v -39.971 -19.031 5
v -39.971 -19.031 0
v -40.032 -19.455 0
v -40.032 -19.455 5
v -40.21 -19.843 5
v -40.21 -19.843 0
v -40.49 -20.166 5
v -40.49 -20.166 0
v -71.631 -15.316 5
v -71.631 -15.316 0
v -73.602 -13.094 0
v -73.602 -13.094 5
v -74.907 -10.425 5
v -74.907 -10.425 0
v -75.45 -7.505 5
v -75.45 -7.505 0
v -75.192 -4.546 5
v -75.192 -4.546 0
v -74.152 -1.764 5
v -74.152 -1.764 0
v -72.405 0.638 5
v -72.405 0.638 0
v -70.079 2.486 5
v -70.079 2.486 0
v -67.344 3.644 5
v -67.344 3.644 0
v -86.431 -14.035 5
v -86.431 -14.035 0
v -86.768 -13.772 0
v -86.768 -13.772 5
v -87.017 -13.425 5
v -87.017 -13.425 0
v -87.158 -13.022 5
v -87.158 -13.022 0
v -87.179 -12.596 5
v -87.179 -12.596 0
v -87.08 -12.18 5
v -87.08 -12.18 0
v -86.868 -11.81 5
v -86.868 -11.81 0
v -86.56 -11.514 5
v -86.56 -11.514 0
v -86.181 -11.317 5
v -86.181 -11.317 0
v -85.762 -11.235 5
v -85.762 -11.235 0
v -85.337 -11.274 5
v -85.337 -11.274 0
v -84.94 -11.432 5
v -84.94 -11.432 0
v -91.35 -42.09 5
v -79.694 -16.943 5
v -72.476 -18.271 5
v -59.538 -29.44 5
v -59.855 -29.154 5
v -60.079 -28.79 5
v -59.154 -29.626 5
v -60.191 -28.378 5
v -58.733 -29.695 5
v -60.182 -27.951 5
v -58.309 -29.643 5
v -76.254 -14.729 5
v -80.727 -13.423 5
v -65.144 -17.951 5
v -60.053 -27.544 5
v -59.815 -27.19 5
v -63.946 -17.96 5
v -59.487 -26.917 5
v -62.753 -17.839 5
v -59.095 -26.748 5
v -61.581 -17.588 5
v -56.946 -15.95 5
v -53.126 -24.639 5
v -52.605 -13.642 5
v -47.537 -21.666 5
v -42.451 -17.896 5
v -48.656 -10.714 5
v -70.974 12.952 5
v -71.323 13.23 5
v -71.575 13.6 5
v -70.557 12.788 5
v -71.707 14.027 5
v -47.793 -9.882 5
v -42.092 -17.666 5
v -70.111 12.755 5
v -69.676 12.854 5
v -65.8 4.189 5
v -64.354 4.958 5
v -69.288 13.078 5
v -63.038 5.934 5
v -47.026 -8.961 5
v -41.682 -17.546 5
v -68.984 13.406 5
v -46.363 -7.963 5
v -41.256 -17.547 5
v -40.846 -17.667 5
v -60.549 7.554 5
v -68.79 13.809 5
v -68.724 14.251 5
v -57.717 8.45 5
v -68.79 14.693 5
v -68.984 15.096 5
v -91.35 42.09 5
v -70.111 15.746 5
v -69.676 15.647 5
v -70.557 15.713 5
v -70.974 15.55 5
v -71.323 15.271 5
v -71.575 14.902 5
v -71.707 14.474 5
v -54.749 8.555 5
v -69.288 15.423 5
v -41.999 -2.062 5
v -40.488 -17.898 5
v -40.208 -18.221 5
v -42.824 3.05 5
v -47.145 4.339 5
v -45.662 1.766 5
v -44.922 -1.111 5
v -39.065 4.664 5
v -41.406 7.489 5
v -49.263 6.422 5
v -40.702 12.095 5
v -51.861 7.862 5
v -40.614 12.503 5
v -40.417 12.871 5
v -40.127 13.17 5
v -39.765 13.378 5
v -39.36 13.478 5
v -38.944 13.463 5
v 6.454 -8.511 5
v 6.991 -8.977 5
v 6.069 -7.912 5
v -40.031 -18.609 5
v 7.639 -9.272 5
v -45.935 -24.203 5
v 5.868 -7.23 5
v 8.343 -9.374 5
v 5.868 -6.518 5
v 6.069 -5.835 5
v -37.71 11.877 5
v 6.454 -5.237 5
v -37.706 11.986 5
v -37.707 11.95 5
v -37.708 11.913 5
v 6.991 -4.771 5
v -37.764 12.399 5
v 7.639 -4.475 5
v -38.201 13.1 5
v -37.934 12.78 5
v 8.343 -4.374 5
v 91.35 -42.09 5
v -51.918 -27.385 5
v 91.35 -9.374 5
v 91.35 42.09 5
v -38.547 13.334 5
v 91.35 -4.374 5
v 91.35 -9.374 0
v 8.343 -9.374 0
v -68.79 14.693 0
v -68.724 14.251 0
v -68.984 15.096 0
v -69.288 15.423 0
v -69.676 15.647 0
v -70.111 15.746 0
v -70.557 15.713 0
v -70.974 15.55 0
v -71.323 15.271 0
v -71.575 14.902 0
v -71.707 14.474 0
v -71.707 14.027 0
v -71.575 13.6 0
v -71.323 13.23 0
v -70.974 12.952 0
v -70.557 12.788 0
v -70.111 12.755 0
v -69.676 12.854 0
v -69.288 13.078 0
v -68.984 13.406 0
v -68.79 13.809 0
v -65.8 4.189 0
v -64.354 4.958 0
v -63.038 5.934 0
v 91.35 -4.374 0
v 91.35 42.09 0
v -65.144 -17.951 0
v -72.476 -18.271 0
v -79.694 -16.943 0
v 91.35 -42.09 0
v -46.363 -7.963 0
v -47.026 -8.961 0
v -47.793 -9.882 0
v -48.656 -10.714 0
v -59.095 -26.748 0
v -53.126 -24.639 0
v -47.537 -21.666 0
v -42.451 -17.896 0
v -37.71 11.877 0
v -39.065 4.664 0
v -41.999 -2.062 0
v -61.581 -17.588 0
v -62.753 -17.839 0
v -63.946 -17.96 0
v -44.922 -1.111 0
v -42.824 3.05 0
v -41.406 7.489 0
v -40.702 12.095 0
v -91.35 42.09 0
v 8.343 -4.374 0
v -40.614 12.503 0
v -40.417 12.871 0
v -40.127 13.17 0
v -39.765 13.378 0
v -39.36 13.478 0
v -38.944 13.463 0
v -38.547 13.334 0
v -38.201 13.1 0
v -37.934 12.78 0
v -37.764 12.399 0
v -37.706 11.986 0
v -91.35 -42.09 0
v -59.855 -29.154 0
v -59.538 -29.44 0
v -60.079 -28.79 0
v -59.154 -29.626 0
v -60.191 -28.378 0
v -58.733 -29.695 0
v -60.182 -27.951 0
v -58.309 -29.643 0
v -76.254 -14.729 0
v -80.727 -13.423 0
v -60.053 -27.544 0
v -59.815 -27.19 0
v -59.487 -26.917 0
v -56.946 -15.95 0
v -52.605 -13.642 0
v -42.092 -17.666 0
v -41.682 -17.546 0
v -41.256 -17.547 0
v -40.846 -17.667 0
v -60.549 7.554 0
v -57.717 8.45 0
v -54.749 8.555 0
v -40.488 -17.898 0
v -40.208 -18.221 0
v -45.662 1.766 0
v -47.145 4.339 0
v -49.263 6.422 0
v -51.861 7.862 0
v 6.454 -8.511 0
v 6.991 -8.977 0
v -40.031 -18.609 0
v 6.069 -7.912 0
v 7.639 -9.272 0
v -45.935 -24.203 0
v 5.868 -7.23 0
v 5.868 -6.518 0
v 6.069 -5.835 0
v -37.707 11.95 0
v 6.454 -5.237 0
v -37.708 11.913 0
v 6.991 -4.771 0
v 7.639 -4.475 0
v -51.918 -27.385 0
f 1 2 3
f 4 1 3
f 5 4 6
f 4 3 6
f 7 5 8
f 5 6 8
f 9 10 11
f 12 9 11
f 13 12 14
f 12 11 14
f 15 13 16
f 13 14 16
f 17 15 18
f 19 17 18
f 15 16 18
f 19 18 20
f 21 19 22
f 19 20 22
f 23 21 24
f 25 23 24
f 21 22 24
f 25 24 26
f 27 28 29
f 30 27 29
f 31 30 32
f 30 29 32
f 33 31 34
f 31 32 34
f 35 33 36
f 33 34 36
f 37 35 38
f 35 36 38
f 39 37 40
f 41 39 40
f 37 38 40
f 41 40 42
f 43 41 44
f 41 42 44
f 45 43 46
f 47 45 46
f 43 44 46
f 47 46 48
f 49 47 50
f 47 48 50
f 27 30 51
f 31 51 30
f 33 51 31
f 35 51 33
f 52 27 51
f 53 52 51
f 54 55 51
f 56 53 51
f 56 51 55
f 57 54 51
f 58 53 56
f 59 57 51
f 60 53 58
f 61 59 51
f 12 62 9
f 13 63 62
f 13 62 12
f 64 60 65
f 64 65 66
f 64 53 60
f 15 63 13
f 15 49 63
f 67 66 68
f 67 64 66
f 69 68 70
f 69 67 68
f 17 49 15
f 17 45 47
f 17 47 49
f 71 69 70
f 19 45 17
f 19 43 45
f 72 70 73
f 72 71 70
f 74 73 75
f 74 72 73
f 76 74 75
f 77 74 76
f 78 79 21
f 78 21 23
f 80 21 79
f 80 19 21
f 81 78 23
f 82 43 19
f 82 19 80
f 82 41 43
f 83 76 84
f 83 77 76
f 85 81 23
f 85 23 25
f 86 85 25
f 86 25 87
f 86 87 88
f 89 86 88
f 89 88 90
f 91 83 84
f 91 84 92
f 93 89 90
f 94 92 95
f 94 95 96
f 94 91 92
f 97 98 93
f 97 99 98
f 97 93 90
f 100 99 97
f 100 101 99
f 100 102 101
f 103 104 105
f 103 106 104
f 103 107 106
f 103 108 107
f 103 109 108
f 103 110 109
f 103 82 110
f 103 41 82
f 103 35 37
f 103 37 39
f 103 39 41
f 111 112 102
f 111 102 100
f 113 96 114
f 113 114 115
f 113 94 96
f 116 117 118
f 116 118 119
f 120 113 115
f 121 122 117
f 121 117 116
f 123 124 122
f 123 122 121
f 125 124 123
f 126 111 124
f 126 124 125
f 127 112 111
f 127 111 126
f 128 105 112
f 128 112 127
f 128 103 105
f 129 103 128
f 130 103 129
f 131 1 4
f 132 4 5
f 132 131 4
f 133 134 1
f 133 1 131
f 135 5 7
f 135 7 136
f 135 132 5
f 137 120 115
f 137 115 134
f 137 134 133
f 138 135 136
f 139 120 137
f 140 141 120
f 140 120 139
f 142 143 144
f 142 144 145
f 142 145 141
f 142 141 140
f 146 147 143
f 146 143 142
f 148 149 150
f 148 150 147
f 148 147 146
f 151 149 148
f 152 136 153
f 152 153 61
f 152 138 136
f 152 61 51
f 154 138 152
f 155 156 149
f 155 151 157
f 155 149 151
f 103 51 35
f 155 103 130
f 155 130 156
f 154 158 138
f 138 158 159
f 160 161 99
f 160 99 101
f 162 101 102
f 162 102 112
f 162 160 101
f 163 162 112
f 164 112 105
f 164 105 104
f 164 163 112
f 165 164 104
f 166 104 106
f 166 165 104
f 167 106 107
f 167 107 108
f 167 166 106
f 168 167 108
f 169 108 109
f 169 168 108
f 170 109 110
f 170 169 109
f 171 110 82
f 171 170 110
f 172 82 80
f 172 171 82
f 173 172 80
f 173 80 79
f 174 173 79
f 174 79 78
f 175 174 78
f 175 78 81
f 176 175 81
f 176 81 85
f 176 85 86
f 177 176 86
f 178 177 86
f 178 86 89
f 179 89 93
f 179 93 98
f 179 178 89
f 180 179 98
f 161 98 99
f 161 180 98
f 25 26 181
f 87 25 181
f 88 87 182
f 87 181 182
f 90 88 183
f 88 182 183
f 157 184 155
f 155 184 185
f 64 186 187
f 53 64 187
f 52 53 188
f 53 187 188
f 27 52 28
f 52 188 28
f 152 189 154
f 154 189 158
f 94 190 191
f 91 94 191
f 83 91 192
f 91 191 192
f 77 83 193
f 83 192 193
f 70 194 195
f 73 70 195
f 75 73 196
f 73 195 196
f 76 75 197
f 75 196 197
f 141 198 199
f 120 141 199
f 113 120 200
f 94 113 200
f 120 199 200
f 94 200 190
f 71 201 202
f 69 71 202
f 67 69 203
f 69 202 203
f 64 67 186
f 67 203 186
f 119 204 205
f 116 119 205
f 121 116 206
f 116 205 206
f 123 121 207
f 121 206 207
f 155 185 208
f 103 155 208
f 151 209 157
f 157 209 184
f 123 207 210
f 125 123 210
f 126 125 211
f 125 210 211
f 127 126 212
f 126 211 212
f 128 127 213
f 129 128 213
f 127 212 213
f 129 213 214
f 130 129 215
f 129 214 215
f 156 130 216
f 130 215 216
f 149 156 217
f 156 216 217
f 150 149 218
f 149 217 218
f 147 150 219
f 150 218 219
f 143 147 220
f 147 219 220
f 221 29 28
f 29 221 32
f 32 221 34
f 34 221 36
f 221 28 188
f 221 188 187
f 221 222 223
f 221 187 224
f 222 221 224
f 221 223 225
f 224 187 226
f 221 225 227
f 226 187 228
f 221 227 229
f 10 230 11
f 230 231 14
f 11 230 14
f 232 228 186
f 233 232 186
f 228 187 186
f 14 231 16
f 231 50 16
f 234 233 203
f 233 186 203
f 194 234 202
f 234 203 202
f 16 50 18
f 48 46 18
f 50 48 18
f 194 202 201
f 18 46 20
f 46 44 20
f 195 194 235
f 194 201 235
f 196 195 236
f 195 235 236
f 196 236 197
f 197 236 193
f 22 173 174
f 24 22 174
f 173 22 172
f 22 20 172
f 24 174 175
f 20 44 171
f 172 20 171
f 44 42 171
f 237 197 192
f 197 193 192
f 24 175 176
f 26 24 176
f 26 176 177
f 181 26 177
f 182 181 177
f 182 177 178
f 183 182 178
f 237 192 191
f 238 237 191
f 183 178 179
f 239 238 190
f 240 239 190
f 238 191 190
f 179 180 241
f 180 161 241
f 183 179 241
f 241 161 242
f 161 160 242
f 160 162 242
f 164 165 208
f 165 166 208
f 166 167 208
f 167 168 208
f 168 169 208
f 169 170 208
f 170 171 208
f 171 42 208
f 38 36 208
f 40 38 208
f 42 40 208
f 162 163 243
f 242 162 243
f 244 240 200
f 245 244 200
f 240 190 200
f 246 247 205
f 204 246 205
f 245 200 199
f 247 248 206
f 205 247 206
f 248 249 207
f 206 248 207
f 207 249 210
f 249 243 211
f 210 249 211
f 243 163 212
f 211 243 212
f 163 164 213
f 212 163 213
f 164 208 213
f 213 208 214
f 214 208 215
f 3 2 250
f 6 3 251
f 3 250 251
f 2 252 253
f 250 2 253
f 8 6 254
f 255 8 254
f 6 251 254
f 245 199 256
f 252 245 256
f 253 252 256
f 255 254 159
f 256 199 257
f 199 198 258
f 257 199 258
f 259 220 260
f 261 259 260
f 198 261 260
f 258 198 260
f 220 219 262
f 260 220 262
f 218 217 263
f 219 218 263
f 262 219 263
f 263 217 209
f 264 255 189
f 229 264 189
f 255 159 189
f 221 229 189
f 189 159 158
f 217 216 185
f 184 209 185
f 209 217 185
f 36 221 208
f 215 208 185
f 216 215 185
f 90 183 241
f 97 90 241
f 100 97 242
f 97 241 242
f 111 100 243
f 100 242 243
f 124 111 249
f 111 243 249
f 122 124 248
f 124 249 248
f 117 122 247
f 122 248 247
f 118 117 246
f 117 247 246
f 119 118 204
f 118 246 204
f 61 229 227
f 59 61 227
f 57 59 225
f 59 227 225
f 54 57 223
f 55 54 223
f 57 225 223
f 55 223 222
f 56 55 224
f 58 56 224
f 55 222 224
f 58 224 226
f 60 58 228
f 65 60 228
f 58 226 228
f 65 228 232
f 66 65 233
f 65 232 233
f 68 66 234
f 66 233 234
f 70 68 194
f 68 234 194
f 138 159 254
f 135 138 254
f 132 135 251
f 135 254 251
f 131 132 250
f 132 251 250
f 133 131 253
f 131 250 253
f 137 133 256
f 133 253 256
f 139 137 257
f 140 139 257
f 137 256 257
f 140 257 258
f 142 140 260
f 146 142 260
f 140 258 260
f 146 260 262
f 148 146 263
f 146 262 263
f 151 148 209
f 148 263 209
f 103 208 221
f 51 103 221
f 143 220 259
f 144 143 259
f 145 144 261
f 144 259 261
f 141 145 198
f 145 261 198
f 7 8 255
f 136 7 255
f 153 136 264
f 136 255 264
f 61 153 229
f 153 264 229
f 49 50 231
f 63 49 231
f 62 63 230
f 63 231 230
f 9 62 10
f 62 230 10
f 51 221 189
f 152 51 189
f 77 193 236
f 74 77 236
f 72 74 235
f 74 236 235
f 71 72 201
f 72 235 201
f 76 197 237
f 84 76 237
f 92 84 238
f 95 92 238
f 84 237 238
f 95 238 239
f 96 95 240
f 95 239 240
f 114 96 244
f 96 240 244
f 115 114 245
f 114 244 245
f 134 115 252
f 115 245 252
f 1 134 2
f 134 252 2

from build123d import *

# Parameters (mm, degrees)
SKETCH1_R           = 1.5
BOSS_EXTRUDE1_DEPTH = 5


with BuildPart() as part:
    # Sketch1 → Boss-Extrude1 (new body)
    with BuildSketch(Plane.XY):
        with BuildLine():
            Line((-91.35, 42.09), (-91.35, -42.09))
            Line((-91.35, -42.09), (91.35, -42.09))
            Line((91.35, -42.09), (91.35, -9.373756295))
            Line((91.35, -9.373756295), (8.343053199, -9.373756295))
            ThreePointArc((8.343053199, -9.373756295), (5.843053199, -6.873756295), (8.343053199, -4.373756295))
            Line((8.343053199, -4.373756295), (91.35, -4.373756295))
            Line((91.35, -4.373756295), (91.35, 42.09))
            Line((91.35, 42.09), (-91.35, 42.09))
        make_face()
        with BuildLine():
            ThreePointArc((-40.489979298, -20.16630551), (-48.867123378, -25.905481248), (-58.308825968, -29.642984865))
            ThreePointArc((-58.308825968, -29.642984865), (-60.149390448, -28.588317906), (-59.094723489, -26.747753426))
            ThreePointArc((-59.094723489, -26.747753426), (-50.275796541, -23.25677592), (-42.451209718, -17.896156784))
            ThreePointArc((-42.451209718, -17.896156784), (-40.846464239, -17.667243828), (-39.970594508, -19.031231147))
            ThreePointArc((-39.970594508, -19.031231147), (-40.106607189, -19.655361416), (-40.489979298, -20.16630551))
        make_face(mode=Mode.SUBTRACT)
        with BuildLine():
            ThreePointArc((-65.144358521, -17.951194504), (-76.122435192, -17.811173415), (-86.43146485, -14.034709351))
            ThreePointArc((-86.43146485, -14.034709351), (-86.987178316, -11.987471568), (-84.939940533, -11.431758101))
            ThreePointArc((-84.939940533, -11.431758101), (-78.516125038, -14.163976019), (-71.631092615, -15.315821832))
            ThreePointArc((-71.631092615, -15.315821832), (-75.191833702, -4.546421602), (-67.344295246, 3.643511155))
            ThreePointArc((-67.344295246, 3.643511155), (-65.062648548, 4.546702365), (-63.038259097, 5.933610208))
            ThreePointArc((-63.038259097, 5.933610208), (-51.860585441, 7.861943698), (-44.921737847, -1.110862578))
            ThreePointArc((-44.921737847, -1.110862578), (-42.027839791, 5.241756905), (-40.702136642, 12.095437041))
            ThreePointArc((-40.702136642, 12.095437041), (-39.151472366, 13.485222207), (-37.706118198, 11.986217927))
            ThreePointArc((-37.706118198, 11.986217927), (-37.707113918, 11.931572095), (-37.710099754, 11.876998812))
            ThreePointArc((-37.710099754, 11.876998812), (-40.341925186, 1.21814014), (-46.362913364, -7.96257196))
            ThreePointArc((-46.362913364, -7.96257196), (-47.396661948, -9.432315012), (-48.655902683, -10.714147119))
            ThreePointArc((-48.655902683, -10.714147119), (-54.732378683, -14.877136713), (-61.581046755, -17.588186064))
            ThreePointArc((-61.581046755, -17.588186064), (-63.34782833, -17.915697351), (-65.144358521, -17.951194504))
        make_face(mode=Mode.SUBTRACT)
        with Locations((-70.223567272, 14.250694236)):
            Circle(SKETCH1_R, mode=Mode.SUBTRACT)
    extrude(amount=BOSS_EXTRUDE1_DEPTH)


solid = part.part
